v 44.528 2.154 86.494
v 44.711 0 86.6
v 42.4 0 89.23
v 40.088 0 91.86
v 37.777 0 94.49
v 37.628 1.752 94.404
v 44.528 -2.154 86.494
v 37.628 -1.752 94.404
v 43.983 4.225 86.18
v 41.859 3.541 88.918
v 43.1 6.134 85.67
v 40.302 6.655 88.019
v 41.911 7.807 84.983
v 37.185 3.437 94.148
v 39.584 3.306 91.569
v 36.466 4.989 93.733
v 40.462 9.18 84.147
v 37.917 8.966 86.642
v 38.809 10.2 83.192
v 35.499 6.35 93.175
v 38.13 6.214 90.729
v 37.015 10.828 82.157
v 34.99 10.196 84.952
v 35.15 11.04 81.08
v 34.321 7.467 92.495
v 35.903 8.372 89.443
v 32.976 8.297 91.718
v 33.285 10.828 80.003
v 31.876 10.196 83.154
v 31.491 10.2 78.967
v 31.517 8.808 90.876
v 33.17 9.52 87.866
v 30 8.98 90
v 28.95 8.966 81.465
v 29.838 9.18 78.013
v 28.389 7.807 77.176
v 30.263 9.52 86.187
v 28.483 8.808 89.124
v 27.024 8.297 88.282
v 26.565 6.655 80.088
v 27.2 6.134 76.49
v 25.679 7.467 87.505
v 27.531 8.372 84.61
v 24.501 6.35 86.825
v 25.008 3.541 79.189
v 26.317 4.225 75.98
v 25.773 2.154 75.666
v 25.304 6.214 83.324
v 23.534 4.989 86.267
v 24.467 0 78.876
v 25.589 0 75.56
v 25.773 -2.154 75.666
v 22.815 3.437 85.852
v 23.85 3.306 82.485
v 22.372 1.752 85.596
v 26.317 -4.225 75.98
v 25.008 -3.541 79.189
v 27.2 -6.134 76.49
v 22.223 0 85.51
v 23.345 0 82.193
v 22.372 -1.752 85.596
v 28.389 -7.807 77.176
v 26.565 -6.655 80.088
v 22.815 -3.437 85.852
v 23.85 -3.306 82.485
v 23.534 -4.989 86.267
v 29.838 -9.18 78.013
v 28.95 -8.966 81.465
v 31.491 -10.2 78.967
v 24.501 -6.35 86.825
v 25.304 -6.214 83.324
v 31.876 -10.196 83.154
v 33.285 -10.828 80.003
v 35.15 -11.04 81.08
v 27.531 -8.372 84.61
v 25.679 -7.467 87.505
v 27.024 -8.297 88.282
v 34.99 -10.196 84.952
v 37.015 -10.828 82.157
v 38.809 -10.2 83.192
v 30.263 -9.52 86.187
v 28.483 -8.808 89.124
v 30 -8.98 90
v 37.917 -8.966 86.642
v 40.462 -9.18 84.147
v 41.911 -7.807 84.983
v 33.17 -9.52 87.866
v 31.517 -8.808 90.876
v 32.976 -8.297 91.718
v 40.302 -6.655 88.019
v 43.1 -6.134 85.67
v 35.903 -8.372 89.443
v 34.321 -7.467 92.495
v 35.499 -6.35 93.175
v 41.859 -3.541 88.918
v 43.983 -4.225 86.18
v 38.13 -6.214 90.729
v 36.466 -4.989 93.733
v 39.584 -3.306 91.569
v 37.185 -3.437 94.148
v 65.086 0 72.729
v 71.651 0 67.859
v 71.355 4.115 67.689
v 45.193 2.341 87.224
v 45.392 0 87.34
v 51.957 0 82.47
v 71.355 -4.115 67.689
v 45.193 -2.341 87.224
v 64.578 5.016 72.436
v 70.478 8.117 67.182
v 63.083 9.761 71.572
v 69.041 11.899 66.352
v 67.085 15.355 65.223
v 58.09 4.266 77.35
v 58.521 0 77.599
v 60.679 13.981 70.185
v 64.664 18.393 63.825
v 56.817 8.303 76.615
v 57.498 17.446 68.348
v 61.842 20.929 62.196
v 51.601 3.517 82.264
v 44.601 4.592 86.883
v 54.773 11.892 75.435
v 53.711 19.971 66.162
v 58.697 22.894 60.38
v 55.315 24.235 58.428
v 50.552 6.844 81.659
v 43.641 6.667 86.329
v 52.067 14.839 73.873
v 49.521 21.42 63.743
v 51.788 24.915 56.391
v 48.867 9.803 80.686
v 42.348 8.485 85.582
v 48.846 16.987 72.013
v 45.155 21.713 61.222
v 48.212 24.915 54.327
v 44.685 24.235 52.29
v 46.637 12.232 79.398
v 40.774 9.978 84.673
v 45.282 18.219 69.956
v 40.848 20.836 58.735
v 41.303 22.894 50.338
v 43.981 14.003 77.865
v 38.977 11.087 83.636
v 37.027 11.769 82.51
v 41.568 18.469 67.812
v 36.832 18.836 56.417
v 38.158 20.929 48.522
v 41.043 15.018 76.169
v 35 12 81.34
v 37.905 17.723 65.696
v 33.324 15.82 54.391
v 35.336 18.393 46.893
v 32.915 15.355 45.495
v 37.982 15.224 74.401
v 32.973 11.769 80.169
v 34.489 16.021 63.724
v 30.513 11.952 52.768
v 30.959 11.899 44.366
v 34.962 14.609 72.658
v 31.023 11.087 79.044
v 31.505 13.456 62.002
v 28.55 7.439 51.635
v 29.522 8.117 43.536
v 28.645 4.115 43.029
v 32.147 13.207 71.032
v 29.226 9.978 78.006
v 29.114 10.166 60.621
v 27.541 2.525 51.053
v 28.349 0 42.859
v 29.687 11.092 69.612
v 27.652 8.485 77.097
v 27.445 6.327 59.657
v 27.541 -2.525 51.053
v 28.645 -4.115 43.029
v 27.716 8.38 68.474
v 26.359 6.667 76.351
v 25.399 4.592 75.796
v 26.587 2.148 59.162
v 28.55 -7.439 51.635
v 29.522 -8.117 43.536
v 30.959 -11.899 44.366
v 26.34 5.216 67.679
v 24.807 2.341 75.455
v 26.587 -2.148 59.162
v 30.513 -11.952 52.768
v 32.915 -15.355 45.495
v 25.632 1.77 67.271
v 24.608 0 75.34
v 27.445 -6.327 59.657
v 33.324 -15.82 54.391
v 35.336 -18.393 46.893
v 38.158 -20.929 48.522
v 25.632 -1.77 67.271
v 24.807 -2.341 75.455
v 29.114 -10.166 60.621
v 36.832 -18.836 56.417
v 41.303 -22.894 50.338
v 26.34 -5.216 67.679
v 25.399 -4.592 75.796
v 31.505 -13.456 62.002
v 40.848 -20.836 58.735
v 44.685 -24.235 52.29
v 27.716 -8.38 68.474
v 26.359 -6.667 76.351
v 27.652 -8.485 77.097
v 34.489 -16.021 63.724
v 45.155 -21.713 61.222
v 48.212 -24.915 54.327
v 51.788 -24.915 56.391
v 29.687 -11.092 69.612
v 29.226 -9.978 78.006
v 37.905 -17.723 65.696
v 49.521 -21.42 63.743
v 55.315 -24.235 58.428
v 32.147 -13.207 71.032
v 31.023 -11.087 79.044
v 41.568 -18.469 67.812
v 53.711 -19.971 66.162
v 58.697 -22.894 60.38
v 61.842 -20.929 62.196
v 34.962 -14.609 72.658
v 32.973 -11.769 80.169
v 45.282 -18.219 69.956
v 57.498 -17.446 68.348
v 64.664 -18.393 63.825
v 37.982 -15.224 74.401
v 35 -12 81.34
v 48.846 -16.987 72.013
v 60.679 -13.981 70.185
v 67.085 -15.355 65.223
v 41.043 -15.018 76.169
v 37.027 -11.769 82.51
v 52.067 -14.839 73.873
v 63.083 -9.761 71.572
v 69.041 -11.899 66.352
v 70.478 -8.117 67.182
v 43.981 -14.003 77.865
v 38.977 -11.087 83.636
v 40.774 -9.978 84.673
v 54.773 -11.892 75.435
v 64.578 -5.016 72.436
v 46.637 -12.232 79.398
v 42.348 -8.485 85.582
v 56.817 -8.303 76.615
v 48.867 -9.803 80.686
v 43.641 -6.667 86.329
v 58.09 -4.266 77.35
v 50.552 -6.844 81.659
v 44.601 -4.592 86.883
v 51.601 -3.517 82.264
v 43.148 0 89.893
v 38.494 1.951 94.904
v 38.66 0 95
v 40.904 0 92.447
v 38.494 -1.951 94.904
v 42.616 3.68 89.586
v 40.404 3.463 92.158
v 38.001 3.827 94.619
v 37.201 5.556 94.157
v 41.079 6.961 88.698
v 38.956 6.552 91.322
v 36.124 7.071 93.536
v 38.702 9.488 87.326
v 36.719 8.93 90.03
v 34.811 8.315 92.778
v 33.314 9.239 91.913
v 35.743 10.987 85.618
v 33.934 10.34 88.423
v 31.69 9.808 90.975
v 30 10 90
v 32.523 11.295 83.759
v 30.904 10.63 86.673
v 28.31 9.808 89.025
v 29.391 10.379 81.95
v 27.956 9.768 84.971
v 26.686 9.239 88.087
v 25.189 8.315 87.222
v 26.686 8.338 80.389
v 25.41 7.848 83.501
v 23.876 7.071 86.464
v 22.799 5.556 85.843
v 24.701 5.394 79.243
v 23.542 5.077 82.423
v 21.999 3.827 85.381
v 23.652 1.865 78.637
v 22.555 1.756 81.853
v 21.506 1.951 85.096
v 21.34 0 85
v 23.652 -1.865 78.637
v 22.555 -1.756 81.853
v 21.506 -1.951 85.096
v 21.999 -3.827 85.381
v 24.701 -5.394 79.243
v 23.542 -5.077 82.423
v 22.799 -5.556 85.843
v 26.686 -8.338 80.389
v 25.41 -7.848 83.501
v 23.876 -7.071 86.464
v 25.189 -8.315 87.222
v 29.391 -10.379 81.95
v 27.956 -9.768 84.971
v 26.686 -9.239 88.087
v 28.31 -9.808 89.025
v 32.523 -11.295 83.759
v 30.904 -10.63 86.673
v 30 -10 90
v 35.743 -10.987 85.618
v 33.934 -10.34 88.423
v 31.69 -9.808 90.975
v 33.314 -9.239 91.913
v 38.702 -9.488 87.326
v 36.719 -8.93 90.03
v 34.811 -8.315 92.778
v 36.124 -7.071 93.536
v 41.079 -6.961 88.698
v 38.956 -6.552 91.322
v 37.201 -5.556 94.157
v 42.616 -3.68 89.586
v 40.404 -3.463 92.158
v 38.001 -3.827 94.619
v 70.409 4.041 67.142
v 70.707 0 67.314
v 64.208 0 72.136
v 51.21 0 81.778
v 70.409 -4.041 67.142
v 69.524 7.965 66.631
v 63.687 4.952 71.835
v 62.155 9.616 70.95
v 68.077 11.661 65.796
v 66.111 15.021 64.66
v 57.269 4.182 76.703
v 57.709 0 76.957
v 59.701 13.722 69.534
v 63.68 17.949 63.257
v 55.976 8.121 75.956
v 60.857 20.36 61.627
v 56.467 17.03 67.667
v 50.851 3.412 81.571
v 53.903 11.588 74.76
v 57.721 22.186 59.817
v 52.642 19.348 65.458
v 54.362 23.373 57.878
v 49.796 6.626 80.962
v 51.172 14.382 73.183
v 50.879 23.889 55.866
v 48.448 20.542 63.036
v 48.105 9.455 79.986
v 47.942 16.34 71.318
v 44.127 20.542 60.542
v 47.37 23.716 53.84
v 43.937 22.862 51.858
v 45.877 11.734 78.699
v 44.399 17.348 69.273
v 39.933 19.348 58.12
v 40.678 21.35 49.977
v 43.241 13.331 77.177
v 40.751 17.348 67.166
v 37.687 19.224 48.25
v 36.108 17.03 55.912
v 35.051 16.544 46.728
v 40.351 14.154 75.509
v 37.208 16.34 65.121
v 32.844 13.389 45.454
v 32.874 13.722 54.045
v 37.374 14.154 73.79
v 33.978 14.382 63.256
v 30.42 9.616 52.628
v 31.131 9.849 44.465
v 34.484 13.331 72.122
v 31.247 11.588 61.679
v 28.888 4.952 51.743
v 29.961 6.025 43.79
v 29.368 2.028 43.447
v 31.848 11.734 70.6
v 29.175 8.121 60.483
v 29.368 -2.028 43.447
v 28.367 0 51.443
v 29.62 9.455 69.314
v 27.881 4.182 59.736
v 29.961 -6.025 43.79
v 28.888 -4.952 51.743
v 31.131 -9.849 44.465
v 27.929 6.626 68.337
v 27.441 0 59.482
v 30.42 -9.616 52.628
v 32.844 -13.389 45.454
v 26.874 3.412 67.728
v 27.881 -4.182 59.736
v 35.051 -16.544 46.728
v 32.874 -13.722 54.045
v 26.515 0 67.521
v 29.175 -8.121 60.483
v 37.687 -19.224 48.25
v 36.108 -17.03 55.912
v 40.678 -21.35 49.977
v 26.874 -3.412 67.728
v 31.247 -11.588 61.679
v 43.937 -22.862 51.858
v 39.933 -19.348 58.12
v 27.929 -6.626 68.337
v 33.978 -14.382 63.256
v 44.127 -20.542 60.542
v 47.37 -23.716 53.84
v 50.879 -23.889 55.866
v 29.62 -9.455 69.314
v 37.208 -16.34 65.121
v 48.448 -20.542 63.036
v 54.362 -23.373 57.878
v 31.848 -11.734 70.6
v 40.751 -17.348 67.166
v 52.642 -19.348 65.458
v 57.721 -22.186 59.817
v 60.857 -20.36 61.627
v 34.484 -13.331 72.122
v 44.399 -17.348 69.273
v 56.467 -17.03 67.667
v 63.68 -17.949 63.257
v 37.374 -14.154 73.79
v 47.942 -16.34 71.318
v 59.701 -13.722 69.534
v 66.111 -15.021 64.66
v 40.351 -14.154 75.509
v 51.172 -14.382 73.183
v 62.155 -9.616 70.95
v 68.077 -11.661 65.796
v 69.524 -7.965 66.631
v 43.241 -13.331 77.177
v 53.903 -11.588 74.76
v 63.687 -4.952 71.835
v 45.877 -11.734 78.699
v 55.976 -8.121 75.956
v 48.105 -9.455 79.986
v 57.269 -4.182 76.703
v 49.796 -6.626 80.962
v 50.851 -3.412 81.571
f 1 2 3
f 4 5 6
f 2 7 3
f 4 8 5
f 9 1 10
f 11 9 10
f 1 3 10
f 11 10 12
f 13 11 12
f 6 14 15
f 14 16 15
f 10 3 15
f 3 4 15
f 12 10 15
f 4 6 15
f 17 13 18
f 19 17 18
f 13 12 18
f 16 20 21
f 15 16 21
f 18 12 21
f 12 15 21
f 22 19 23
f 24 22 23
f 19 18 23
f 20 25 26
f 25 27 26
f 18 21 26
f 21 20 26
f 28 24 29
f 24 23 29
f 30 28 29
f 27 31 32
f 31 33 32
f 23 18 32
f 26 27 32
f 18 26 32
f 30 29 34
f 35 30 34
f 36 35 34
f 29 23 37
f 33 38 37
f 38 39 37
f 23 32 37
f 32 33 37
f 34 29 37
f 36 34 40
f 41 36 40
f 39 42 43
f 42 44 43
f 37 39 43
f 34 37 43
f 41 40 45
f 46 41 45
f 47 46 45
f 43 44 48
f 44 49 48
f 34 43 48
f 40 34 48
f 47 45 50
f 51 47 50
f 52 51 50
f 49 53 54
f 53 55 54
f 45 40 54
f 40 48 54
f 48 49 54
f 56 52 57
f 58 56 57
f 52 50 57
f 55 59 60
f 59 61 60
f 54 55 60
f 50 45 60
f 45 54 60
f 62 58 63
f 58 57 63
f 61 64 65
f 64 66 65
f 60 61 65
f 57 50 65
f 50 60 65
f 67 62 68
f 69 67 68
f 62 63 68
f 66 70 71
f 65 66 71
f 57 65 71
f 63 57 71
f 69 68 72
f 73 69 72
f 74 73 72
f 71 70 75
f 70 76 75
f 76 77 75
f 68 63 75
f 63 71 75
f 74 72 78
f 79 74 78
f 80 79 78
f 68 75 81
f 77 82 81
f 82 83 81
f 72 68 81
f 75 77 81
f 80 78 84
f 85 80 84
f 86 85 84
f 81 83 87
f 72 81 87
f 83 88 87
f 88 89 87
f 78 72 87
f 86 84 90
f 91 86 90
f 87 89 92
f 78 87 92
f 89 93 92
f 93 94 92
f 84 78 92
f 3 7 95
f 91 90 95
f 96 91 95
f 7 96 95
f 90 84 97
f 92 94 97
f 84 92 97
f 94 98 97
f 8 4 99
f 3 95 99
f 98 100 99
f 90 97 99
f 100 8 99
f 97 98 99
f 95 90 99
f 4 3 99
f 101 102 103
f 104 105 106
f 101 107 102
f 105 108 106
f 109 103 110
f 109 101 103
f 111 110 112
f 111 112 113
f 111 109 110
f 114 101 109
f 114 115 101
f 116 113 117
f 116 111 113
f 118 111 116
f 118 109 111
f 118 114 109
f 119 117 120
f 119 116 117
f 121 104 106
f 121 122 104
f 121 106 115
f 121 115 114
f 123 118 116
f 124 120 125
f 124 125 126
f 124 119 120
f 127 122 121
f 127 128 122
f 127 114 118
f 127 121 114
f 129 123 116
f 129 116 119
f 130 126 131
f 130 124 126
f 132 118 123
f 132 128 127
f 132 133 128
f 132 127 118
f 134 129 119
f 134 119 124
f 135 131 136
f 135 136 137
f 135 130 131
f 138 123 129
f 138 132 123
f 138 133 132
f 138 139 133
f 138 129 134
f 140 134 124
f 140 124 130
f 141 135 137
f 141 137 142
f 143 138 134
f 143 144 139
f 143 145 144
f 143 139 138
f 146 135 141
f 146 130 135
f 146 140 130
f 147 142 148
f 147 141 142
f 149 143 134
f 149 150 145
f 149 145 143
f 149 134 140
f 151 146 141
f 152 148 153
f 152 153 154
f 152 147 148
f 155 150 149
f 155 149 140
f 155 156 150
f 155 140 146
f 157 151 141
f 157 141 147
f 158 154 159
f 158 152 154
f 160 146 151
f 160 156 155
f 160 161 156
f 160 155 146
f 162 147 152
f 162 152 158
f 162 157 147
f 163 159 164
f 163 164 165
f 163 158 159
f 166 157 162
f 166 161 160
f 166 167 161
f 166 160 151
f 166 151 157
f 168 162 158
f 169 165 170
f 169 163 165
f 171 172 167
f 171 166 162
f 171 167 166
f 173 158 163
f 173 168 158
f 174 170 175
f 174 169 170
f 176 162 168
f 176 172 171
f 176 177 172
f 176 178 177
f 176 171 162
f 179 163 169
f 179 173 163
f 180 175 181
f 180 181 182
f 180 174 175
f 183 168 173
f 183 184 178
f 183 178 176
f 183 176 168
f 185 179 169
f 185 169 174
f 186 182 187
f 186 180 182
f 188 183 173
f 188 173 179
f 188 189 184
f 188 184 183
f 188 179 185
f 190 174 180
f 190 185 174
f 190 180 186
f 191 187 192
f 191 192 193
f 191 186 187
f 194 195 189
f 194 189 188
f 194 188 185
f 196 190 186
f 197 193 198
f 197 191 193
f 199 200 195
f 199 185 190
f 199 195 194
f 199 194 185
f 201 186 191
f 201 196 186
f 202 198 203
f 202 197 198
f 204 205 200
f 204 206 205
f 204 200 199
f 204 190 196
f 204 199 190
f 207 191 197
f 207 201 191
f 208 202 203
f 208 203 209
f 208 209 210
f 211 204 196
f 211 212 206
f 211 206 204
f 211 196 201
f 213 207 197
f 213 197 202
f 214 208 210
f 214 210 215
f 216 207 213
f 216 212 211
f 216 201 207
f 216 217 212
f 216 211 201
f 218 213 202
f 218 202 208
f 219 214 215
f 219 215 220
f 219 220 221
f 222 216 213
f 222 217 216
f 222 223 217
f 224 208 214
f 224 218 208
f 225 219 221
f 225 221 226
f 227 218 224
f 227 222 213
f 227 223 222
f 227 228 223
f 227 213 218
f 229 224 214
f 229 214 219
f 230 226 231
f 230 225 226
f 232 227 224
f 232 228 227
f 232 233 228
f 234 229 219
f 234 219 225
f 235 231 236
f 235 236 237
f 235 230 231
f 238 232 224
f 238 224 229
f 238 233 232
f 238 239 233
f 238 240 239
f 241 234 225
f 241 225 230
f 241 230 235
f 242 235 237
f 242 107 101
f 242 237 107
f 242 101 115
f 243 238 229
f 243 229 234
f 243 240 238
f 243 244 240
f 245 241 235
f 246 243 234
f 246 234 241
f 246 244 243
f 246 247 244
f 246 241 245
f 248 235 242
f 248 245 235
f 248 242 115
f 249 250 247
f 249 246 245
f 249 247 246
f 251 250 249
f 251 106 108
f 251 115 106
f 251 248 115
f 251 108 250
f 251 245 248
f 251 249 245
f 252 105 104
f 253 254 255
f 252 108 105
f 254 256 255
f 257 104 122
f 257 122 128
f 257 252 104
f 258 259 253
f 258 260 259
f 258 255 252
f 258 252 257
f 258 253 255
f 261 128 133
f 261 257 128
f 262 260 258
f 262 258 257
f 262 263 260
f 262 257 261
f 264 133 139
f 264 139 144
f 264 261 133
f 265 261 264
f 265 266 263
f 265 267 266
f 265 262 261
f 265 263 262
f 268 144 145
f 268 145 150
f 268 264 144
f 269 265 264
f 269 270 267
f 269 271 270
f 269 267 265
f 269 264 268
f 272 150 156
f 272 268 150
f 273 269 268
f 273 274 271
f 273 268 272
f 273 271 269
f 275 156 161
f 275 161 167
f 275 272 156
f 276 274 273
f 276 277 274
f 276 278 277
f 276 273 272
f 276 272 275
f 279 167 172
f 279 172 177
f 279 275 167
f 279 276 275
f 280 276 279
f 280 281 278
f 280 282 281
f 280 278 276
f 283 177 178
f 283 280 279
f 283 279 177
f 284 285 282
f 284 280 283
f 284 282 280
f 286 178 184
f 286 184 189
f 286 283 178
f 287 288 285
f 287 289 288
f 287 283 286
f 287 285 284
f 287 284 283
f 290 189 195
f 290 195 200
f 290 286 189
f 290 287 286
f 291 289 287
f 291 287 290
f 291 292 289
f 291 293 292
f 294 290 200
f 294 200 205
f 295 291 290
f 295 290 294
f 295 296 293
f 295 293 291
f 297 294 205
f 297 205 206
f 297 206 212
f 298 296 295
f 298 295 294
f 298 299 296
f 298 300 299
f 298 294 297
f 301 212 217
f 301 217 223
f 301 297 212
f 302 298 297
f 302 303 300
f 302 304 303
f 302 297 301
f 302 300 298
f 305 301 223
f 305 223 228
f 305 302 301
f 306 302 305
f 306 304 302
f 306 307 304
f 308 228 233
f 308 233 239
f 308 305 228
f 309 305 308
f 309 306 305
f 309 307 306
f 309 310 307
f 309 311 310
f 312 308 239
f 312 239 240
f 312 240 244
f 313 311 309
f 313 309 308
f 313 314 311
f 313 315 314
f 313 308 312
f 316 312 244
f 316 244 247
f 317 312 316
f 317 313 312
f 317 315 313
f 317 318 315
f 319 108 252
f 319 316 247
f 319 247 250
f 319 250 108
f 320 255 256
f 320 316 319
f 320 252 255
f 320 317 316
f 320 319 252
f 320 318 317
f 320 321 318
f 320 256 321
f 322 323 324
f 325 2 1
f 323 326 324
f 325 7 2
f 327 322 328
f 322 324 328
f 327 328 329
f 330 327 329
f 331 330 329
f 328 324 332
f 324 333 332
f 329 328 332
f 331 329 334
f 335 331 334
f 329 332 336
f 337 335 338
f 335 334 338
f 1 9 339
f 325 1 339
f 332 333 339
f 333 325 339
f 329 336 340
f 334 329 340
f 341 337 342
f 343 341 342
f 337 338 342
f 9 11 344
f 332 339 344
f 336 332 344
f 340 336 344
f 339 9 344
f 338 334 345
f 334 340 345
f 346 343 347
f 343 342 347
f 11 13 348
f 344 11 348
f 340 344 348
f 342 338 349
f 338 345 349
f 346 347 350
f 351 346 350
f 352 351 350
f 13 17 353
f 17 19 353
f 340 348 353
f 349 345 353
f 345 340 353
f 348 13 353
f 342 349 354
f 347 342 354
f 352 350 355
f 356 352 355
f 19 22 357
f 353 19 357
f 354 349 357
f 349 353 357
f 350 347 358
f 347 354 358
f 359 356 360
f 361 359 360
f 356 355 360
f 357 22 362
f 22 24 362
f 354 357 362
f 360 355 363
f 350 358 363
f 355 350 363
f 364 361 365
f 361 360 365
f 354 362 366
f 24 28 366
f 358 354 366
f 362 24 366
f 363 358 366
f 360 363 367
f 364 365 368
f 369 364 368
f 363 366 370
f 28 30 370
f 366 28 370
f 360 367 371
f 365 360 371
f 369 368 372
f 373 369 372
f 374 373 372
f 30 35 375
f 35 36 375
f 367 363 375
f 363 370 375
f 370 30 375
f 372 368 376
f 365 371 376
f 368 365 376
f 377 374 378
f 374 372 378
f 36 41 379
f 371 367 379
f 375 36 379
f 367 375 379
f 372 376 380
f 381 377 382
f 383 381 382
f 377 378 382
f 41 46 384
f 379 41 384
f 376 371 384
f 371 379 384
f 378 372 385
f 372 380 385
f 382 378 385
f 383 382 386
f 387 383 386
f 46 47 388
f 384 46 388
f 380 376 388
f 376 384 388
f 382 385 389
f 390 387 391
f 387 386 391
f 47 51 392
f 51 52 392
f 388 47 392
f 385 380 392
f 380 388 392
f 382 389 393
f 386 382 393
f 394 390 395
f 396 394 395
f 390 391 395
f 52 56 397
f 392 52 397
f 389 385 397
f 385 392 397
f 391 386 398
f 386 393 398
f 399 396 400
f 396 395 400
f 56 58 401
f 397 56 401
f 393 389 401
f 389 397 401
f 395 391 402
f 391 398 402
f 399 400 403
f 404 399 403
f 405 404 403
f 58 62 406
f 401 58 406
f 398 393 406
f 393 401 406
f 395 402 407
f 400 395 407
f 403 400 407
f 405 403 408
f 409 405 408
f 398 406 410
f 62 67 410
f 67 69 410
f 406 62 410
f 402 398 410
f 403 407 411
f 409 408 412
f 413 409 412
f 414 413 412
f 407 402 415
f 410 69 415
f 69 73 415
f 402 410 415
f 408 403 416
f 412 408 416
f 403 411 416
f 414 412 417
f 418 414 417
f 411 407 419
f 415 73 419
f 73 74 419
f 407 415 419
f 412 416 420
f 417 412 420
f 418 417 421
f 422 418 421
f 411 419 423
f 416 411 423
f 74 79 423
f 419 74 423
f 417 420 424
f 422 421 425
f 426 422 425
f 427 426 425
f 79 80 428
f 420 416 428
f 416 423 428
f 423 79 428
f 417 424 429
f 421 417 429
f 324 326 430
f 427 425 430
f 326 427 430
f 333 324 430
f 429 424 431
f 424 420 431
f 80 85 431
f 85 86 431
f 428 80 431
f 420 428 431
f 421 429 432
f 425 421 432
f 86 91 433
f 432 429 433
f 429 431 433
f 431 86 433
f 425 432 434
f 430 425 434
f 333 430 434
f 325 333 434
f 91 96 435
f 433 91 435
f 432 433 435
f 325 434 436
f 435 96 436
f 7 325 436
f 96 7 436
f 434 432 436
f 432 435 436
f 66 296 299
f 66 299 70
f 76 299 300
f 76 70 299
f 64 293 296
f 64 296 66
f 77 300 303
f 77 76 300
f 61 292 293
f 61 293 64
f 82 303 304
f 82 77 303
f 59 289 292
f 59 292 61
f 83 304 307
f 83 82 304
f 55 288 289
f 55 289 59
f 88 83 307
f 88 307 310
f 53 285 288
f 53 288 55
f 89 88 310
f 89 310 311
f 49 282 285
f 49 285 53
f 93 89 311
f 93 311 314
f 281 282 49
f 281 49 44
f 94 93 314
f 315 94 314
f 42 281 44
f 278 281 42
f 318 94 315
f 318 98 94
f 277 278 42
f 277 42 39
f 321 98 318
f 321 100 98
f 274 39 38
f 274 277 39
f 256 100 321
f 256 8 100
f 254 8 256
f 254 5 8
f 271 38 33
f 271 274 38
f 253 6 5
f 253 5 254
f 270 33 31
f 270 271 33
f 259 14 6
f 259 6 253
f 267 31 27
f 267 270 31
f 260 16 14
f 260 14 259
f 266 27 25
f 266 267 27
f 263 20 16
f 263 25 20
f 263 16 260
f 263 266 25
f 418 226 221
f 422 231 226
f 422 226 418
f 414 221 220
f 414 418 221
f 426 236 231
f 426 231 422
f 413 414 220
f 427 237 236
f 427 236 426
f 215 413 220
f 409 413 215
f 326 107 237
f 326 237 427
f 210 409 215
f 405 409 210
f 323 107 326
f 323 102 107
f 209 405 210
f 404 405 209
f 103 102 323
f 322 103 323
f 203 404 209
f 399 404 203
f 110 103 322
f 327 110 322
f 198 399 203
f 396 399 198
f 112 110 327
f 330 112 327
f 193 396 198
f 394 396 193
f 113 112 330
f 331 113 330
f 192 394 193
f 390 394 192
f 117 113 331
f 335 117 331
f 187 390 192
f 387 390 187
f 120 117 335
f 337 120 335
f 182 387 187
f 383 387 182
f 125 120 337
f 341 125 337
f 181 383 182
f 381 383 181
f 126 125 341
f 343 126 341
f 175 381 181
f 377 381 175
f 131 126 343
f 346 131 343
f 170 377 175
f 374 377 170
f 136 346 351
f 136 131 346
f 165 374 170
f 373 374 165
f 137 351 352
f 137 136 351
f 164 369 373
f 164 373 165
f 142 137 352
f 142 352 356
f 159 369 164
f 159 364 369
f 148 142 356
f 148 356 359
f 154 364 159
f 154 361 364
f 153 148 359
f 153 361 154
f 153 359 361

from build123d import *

# Parameters (mm, degrees)
F2_T     = -1
F5_ANGLE = 30


with BuildPart() as f1:
    # F0 (on Front) → F1 (revolve)
    with BuildSketch(Plane.XZ):
        Polygon((10, 40), (0, 40), (0, 0), (25, 0), (12, 30), align=None)
    revolve(axis=Axis((0, 0, 20), (0, 0, 1)))

    # F2
    f2_openings = [f1.faces().sort_by_distance(p)[0] for p in [
        (0, 0, 0),
        (0, 0, 40),
    ]]
    offset(amount=F2_T, openings=f2_openings, kind=Kind.INTERSECTION)


with BuildPart() as f1_1:
    # F3: moved
    add(f1.part.moved(Location((30, 0, 50))))


with BuildPart() as f1_2:
    # F5: moved
    add(f1_1.part.rotate(Axis((30, 0, 90), (0, -1, 0)), F5_ANGLE))


solid = f1_2.part
